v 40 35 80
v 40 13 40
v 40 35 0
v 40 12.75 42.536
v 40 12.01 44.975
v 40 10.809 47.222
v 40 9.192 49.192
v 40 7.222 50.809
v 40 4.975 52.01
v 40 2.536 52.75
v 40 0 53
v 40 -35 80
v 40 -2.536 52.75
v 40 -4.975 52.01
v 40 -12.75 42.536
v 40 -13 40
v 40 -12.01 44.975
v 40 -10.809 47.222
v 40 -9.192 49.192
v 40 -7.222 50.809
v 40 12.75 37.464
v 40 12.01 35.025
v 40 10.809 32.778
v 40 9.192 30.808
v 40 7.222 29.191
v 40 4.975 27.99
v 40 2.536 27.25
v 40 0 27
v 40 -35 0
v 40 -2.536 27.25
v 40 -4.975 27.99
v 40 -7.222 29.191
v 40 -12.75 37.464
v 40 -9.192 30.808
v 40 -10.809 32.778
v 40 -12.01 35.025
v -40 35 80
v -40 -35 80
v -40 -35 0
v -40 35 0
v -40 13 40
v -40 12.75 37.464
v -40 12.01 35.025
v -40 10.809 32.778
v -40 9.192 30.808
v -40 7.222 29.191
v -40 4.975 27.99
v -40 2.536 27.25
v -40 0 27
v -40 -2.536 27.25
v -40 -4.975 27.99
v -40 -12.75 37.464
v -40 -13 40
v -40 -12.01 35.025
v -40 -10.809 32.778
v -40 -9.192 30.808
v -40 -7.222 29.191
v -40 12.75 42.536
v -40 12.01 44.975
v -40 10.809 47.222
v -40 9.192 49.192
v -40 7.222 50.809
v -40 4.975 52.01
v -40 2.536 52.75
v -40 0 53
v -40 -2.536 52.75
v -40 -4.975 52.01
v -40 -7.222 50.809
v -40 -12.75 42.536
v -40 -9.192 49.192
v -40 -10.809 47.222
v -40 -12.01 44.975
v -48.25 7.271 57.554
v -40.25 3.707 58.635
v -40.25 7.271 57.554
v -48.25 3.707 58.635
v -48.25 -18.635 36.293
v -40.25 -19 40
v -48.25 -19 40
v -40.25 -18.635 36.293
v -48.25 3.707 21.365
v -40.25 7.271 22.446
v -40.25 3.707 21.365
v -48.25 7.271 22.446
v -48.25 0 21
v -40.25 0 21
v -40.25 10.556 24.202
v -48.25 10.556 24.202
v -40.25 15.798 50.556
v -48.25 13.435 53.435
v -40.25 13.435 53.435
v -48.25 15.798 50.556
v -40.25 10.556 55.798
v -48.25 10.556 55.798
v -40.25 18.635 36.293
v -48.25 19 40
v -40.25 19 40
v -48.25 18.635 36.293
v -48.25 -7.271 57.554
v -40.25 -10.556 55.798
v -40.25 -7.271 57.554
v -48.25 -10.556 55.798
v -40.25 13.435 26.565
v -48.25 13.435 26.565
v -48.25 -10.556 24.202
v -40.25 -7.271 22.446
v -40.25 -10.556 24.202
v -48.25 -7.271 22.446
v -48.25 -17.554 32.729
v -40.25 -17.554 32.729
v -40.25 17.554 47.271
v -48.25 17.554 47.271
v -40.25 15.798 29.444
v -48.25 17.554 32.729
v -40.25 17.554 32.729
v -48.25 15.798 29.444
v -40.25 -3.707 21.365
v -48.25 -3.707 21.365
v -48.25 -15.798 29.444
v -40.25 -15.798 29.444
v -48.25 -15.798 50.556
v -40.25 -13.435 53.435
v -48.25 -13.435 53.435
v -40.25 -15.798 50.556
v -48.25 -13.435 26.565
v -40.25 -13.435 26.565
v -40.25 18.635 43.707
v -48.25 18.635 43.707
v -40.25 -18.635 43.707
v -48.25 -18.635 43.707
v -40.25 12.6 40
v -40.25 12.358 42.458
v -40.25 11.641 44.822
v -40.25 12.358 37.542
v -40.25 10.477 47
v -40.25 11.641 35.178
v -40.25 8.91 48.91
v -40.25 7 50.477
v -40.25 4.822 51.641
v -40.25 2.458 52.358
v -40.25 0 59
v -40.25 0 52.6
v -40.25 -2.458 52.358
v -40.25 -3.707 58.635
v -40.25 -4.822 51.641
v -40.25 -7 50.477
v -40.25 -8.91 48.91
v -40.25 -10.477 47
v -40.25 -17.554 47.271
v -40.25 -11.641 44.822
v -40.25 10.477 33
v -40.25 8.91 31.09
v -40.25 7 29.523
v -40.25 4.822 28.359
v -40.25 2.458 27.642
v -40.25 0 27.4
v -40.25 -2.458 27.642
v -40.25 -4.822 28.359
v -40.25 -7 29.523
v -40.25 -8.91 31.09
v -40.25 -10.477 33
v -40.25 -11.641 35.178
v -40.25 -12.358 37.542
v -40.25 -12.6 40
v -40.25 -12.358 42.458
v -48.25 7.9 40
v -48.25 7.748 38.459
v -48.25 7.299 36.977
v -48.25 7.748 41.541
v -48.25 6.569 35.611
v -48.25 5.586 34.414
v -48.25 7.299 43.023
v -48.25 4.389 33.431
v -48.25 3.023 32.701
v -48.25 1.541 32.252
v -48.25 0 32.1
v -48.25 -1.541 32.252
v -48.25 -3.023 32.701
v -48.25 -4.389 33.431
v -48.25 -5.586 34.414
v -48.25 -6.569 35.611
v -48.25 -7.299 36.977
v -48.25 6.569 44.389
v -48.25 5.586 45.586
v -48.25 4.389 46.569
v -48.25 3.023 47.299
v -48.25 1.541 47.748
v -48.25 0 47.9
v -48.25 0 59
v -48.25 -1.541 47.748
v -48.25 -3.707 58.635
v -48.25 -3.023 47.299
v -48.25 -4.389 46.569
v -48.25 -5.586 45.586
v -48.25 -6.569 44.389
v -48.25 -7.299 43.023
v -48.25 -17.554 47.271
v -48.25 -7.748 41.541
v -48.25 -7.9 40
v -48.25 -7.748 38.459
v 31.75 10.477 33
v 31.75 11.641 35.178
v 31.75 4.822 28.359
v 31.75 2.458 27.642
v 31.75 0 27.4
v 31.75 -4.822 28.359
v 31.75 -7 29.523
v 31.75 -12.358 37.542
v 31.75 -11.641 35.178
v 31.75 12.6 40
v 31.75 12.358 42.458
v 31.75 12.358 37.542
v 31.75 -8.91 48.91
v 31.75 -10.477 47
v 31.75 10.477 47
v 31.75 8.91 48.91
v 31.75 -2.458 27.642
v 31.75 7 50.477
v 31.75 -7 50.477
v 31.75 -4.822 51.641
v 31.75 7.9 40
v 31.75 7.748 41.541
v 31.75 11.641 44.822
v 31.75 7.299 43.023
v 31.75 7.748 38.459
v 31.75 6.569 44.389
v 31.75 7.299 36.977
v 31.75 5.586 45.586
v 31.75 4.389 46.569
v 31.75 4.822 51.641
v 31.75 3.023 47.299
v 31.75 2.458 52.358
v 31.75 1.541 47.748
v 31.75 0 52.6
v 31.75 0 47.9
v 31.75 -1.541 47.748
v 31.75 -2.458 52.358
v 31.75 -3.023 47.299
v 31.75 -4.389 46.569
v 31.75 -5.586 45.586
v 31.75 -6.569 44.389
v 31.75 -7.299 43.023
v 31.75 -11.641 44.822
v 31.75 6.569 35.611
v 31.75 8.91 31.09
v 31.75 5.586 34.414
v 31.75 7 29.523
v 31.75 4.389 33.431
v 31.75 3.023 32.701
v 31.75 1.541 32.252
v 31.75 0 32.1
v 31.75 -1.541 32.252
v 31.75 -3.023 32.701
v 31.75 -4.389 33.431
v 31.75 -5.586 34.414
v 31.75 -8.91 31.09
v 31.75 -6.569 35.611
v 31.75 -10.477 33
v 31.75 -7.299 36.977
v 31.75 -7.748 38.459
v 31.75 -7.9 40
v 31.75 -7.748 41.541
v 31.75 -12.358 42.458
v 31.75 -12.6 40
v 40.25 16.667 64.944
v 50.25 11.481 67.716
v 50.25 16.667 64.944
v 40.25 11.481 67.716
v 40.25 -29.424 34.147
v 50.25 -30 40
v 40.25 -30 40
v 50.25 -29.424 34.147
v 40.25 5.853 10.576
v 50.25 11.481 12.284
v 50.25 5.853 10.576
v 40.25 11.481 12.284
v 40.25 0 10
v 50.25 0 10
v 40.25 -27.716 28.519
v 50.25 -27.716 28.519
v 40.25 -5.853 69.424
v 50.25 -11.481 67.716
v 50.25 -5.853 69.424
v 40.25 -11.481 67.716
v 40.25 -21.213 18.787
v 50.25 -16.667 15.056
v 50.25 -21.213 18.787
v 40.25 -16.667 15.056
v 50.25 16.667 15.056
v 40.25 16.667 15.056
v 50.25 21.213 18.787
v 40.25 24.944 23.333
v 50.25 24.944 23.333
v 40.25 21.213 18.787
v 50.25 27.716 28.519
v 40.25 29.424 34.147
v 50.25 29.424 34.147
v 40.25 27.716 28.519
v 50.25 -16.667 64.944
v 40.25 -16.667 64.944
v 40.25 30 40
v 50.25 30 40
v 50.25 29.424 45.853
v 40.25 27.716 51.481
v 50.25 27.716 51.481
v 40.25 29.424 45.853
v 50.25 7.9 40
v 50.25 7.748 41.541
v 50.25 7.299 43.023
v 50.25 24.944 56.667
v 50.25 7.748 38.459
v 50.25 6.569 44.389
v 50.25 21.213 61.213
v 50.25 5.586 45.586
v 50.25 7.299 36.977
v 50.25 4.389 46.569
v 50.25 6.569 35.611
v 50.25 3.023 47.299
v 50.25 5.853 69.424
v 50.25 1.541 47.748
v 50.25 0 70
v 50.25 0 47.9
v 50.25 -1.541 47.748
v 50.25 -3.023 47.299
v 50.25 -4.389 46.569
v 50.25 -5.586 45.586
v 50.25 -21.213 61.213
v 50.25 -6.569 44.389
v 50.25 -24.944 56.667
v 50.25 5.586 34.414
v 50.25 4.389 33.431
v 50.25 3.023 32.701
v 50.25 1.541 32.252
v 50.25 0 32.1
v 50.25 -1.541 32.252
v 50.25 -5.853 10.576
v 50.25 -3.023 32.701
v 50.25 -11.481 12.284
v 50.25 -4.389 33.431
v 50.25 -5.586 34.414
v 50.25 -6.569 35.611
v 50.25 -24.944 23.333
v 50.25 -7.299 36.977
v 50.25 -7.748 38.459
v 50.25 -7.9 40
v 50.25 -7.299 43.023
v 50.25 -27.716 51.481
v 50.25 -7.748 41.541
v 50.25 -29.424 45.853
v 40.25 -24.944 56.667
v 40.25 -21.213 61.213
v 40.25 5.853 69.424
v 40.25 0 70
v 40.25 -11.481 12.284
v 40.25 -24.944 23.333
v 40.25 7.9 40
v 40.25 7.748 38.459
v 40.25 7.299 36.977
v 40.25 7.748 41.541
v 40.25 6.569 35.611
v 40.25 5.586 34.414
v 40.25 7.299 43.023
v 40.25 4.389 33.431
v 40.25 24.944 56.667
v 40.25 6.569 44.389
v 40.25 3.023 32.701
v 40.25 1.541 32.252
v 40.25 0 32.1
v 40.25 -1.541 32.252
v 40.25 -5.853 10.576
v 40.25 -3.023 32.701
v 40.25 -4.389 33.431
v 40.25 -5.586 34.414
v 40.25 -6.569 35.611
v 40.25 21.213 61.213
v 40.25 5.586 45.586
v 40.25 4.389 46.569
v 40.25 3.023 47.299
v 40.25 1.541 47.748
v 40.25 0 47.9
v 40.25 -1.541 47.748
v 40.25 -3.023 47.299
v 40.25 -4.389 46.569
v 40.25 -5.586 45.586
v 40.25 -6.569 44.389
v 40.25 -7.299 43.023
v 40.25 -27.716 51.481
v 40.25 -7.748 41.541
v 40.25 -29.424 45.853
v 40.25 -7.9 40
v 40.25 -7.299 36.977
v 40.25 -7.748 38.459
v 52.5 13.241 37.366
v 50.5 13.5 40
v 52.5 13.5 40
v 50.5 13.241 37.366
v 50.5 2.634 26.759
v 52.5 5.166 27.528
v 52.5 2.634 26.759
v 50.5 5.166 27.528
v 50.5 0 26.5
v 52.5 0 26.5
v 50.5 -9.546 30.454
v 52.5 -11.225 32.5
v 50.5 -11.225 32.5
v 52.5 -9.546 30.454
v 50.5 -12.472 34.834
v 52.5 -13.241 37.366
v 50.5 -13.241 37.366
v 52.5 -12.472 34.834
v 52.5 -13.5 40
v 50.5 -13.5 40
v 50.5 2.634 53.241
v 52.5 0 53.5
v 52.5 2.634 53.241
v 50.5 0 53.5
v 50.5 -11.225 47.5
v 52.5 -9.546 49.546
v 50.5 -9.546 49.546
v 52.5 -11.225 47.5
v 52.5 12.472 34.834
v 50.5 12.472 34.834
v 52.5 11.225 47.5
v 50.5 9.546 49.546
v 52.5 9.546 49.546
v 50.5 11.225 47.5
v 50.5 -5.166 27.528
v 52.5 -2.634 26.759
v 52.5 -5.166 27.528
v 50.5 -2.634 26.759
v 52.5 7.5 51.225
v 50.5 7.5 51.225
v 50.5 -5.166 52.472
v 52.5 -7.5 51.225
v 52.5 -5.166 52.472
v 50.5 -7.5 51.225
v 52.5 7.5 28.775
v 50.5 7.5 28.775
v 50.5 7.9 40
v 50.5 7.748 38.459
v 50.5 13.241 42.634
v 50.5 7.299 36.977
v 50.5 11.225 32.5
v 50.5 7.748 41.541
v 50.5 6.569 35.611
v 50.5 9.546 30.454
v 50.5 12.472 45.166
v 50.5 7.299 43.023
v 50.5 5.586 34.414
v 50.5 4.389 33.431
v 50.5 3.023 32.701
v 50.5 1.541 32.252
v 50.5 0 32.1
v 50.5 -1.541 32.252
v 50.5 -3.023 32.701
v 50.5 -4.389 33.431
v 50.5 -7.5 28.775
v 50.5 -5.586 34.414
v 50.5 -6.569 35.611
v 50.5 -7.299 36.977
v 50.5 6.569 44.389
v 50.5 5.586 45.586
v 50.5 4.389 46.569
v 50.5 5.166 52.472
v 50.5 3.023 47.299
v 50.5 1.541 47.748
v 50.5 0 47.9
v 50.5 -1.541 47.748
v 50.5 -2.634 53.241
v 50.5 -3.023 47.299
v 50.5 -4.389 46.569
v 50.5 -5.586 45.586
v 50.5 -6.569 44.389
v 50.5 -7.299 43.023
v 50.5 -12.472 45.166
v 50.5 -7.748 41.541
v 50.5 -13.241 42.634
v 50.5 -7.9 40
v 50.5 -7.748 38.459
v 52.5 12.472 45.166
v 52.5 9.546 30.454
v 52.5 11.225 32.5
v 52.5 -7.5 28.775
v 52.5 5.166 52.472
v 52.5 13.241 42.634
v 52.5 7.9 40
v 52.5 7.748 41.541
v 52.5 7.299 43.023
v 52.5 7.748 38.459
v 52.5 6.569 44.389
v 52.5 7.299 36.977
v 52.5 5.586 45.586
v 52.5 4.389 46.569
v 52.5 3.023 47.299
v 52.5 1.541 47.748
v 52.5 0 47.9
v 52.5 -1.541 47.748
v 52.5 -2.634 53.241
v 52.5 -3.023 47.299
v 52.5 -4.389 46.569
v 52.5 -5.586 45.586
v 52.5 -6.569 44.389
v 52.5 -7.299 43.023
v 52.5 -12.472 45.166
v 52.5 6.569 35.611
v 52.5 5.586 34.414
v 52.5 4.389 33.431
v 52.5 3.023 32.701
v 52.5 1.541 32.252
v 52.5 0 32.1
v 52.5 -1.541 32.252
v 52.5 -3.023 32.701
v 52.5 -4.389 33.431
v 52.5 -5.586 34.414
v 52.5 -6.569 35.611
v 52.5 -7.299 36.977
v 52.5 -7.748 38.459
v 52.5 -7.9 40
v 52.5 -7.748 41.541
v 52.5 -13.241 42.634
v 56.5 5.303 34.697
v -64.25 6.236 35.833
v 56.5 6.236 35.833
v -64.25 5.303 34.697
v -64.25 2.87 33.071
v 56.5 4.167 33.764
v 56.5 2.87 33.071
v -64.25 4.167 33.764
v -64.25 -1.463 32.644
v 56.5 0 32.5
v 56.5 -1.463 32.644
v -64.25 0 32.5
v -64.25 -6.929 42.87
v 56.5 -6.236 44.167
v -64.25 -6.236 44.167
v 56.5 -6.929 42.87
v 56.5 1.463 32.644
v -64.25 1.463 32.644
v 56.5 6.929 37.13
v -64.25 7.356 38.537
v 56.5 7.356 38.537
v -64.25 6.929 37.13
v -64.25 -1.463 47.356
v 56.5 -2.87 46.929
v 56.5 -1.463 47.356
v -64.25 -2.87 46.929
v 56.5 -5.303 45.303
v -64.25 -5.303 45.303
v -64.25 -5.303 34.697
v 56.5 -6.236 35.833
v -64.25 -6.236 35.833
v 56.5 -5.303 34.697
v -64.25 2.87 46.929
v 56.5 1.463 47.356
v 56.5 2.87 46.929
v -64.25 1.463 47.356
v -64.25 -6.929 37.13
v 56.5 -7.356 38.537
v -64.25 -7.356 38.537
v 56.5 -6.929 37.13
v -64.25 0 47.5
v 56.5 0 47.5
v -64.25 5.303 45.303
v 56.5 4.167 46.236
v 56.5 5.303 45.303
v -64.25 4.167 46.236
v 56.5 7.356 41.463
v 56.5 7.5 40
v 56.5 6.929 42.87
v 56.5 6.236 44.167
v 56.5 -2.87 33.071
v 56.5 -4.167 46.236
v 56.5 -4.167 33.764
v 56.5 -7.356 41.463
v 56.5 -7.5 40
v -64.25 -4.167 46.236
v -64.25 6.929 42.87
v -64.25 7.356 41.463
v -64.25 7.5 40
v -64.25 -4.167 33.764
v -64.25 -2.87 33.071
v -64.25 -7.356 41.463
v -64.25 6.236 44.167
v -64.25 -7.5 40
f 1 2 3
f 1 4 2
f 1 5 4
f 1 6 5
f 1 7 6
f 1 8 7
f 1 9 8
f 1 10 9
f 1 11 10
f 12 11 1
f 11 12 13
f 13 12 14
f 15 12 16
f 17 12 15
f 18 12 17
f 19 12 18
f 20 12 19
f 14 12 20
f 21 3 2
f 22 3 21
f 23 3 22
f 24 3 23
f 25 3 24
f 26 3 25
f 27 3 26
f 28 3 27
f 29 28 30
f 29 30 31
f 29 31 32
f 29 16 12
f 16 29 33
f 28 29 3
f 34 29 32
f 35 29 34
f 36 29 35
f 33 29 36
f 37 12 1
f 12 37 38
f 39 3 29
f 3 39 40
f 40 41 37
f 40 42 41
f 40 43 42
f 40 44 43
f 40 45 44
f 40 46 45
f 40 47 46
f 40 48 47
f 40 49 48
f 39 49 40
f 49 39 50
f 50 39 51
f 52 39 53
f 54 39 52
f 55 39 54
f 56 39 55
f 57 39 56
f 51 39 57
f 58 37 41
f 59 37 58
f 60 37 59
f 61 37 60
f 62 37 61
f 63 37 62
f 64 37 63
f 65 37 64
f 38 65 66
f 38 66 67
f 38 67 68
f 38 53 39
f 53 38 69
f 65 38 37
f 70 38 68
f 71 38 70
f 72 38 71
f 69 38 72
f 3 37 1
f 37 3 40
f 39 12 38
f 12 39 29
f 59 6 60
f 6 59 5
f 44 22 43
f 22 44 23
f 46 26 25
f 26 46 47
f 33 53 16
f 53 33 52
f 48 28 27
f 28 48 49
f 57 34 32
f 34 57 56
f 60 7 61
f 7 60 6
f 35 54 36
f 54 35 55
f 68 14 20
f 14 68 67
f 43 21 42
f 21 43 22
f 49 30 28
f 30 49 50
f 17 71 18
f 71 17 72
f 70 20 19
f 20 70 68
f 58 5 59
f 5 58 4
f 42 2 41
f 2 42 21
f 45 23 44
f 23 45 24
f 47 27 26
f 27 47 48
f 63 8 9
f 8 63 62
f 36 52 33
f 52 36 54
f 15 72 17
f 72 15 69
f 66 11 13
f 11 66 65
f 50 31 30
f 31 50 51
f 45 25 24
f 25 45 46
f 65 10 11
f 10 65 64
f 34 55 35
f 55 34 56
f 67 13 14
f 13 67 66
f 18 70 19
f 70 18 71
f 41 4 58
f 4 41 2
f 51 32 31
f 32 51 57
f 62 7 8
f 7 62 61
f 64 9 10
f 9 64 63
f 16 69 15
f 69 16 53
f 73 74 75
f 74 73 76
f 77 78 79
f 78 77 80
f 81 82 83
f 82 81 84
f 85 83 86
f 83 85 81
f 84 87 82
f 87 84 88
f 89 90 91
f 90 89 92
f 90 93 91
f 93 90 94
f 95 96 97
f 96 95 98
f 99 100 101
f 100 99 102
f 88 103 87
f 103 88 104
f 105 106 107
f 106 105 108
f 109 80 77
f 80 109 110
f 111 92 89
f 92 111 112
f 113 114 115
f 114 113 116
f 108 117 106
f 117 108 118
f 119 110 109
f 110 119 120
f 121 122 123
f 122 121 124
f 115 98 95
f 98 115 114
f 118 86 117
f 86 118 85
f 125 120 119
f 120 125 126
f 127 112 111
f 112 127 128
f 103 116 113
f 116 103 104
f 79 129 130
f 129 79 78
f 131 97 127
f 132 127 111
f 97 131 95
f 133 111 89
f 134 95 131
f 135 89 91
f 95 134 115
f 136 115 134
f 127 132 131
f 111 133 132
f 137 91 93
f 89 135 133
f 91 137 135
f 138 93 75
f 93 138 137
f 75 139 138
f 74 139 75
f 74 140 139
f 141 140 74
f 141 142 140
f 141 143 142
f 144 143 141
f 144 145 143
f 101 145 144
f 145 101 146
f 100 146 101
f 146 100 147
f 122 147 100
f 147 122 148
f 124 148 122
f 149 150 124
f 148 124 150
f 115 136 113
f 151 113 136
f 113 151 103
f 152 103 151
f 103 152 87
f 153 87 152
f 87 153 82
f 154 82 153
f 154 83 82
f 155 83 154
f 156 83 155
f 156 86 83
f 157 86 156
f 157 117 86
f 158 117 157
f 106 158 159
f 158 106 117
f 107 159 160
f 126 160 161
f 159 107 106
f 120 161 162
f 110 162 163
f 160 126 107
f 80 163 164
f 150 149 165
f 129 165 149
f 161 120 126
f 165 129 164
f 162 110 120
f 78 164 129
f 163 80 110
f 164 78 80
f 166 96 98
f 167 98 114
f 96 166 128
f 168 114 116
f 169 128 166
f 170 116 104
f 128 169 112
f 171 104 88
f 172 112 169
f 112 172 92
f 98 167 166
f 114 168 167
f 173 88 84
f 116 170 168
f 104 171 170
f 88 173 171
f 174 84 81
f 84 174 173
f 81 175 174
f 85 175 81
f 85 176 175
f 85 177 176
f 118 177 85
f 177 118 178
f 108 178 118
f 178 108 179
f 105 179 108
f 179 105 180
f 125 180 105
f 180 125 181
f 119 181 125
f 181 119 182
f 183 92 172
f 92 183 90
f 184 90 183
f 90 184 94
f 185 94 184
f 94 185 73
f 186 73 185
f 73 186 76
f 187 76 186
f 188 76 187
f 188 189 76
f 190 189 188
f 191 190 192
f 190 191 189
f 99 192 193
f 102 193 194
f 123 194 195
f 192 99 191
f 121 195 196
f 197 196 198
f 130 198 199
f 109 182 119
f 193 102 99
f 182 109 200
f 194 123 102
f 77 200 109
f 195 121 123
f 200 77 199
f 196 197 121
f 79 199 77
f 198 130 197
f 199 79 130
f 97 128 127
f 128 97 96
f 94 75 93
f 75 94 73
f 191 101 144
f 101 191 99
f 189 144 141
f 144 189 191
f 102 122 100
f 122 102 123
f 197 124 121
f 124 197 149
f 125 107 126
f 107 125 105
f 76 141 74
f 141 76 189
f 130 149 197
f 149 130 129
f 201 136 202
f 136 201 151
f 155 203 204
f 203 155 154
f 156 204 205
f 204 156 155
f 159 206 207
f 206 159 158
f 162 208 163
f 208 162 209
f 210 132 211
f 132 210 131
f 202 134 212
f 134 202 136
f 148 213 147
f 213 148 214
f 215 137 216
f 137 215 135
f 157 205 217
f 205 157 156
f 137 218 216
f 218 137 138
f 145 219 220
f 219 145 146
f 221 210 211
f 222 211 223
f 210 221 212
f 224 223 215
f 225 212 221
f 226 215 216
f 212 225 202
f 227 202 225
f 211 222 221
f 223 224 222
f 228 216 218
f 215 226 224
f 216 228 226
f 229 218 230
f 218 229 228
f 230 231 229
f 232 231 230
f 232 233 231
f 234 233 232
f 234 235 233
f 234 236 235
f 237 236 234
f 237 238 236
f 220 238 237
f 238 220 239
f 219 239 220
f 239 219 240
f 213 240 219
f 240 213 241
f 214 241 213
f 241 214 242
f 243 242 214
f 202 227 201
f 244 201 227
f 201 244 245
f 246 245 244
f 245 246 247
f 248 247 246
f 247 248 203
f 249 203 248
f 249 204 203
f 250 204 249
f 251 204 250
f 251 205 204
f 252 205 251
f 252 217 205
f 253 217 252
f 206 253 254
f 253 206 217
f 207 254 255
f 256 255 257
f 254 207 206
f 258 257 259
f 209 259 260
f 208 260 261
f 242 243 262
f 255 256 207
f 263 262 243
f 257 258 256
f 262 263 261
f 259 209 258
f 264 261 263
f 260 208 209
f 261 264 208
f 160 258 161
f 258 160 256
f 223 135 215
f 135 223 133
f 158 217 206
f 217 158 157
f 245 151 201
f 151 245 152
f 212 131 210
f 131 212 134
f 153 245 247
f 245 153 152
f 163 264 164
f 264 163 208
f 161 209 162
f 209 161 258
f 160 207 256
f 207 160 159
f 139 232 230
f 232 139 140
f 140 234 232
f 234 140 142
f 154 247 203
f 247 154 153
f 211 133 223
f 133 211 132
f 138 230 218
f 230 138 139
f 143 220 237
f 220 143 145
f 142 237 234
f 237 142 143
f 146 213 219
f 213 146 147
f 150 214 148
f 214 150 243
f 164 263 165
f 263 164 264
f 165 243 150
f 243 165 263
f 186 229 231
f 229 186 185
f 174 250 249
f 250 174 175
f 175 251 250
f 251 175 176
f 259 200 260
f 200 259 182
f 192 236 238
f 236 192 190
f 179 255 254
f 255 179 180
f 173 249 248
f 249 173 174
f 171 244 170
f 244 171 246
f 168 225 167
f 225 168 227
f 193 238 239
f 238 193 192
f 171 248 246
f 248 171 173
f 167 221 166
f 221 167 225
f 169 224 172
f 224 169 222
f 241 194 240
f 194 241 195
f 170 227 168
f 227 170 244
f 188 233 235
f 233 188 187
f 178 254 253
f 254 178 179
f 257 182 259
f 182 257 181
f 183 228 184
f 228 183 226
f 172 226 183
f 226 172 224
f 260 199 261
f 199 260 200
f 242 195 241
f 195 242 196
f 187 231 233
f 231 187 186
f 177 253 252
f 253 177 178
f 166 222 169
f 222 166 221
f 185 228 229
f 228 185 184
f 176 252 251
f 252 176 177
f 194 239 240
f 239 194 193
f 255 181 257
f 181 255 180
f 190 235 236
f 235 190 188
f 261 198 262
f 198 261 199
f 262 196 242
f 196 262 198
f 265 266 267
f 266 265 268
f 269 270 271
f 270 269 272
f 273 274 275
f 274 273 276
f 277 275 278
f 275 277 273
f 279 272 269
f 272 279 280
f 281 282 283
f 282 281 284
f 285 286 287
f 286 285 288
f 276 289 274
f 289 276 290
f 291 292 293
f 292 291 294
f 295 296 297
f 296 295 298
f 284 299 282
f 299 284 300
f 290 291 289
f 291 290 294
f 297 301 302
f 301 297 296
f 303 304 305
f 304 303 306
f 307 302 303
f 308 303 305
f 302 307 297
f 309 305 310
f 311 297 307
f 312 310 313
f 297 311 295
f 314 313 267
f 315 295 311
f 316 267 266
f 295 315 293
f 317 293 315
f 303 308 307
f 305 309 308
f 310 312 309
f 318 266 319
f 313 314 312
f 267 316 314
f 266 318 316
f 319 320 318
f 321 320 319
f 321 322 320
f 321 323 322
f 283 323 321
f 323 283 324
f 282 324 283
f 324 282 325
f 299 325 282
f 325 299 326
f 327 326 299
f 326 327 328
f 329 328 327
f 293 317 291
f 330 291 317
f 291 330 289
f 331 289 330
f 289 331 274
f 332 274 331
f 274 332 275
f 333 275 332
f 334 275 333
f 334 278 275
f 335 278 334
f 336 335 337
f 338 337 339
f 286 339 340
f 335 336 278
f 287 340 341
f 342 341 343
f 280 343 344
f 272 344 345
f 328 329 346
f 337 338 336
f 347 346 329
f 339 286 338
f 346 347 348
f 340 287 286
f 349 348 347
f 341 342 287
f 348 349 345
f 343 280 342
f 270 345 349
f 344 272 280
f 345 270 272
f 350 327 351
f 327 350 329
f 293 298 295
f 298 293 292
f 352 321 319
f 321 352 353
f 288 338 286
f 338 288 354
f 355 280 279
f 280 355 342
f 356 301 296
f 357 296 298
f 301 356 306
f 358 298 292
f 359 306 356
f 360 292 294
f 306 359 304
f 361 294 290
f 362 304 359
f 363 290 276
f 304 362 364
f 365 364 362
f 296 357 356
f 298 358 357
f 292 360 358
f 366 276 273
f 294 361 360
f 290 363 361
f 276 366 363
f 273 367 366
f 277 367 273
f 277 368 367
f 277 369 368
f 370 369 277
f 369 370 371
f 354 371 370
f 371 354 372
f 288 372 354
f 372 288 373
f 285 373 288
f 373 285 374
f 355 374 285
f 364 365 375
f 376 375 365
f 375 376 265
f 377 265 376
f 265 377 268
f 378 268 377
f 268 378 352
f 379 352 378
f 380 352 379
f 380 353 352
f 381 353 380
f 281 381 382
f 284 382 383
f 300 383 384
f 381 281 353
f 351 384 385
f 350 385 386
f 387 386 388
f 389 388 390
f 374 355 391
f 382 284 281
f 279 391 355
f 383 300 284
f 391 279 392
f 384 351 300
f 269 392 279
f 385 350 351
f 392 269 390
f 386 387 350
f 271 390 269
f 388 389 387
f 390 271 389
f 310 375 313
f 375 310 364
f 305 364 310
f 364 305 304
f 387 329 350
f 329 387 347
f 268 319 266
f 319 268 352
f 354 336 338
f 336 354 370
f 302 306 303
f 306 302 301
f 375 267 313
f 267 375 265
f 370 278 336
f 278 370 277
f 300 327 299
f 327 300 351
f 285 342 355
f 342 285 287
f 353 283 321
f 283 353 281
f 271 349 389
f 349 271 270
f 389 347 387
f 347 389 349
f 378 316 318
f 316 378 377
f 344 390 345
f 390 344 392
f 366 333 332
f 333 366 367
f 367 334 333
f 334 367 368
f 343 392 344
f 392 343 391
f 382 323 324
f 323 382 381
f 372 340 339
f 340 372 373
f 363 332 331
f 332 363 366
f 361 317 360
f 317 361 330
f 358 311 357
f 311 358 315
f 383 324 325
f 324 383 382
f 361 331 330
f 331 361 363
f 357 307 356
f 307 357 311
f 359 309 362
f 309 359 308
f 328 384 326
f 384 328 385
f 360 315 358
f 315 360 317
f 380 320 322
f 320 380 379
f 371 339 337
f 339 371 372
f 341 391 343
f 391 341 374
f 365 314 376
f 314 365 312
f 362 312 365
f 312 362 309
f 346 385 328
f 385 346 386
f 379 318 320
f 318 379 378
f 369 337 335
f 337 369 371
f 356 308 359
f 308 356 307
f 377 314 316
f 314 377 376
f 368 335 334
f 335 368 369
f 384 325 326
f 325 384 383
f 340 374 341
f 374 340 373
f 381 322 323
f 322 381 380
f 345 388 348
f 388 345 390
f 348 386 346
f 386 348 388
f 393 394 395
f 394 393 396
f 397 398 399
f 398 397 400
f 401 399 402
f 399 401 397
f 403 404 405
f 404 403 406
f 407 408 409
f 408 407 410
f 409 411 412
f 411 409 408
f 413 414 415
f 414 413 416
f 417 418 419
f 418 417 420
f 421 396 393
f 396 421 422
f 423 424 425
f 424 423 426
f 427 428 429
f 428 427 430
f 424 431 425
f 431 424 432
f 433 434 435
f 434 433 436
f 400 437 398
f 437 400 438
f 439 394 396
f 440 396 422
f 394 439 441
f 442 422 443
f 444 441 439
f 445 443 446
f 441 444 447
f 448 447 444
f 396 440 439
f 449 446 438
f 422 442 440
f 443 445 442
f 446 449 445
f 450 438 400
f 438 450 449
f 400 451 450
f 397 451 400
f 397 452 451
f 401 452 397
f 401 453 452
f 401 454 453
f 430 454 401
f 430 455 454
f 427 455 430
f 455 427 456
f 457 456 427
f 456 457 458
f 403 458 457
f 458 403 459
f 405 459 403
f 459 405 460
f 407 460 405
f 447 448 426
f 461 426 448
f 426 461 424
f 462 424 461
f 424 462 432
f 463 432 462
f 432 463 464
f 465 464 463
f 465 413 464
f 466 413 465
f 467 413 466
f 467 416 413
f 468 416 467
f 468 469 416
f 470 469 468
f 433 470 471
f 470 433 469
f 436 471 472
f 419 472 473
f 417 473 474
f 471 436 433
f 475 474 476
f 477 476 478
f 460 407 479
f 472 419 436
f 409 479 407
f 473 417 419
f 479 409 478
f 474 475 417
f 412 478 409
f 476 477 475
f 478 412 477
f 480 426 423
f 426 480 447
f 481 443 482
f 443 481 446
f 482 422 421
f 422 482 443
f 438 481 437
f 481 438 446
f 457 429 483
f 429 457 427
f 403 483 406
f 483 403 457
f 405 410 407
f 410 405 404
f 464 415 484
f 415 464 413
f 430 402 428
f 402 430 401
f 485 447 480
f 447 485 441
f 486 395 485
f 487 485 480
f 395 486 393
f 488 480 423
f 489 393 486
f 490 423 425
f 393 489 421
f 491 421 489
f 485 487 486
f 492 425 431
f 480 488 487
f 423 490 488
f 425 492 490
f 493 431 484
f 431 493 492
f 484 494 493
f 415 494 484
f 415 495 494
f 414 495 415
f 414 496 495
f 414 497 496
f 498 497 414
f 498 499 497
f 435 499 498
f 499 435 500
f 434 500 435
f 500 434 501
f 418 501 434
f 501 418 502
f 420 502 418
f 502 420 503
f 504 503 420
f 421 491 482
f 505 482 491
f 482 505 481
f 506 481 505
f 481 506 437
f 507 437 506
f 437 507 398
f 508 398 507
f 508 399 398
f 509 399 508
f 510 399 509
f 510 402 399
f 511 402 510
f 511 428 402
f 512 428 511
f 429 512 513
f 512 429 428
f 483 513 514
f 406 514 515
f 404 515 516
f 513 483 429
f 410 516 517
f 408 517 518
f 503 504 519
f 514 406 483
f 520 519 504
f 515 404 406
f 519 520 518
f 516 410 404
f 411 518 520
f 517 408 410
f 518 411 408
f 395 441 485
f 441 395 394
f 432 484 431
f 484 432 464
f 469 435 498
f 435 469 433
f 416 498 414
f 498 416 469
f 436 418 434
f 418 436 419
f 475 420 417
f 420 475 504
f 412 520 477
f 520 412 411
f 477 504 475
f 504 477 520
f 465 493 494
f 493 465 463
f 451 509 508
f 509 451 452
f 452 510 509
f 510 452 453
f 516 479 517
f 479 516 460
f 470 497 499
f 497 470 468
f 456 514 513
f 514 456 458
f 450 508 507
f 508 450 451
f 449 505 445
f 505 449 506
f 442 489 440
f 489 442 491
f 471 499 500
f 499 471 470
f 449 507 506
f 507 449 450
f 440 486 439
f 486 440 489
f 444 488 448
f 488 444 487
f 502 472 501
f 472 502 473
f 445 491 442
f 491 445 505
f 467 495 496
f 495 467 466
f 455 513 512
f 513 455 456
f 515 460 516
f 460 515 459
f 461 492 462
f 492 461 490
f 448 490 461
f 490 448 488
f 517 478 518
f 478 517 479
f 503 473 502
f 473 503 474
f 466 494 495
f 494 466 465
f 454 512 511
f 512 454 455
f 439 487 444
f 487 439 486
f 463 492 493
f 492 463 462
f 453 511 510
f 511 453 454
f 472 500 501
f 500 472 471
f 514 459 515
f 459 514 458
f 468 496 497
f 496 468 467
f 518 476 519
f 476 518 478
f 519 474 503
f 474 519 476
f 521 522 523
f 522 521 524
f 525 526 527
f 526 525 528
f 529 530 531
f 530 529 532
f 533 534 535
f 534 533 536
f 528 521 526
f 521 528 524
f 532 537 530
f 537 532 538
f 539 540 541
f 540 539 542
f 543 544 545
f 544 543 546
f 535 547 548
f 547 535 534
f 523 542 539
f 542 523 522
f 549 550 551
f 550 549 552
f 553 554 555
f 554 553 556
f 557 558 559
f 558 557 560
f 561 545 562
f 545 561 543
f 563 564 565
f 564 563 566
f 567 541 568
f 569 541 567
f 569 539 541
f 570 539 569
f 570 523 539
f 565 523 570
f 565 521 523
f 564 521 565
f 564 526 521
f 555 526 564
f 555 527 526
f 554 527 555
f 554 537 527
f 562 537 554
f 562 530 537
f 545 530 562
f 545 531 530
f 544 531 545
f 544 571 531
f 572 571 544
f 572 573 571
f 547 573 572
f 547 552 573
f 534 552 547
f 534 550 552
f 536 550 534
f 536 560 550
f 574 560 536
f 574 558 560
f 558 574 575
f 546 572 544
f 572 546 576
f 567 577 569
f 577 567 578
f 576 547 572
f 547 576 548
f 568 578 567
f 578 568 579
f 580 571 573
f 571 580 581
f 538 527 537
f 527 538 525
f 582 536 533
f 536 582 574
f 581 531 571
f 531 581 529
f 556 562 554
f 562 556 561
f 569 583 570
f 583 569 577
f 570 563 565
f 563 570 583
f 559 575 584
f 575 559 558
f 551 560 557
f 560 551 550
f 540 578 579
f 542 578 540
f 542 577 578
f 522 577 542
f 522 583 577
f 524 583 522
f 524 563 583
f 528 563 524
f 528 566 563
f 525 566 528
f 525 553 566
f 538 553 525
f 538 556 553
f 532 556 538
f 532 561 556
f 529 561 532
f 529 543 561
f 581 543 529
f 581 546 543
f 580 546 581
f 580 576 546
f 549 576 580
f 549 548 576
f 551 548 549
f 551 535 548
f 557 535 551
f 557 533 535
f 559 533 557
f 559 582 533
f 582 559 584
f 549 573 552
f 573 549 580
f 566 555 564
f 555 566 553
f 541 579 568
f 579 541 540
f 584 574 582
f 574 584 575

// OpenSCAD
$fn = 32;

// ------------------------------------------------------------------------
// Bushed housing: 80 x 70 x 80 mm housing, bushing d25.2
// Every part is its own module, assembly() places them once.
// ------------------------------------------------------------------------

// --- part 1 ---
module housing() {
  difference() {
    translate([-40, -35, 0]) cube([80, 70, 80]);
    translate([0, 0, 40]) rotate([0, 90, 0]) cylinder(h = 82, d = 26, center = true);
  }
}

// --- part 2 ---
module bushing() {
  difference() {
    union() {
      cylinder(h = 8, d = 38);
      translate([0, 0, 8]) cylinder(h = 72, d = 25.2);
    }
    translate([0, 0, -1]) cylinder(h = 82, d = 15.8);
  }
}

// --- part 3 ---
module shaft() {
  translate([0, 0, -60.375]) cylinder(h = 120.75, d = 15);
}

// --- part 4 ---
module cover() {
  difference() {
    cylinder(h = 10, d = 60);
    translate([0, 0, -1]) cylinder(h = 12, d = 15.8);
  }
}

// --- part 5 ---
module washer() {
  difference() {
      translate([0, 0, 0]) cylinder(h = 2, d = 27);
      translate([0, 0, -1]) cylinder(h = 4, d = 15.8);
    }
}

// --- assembly ---
module assembly() {
  translate([0, 0, 0]) rotate([0, 0, 0]) housing();
  translate([-48.25, 0, 40]) rotate([0, 90, 0]) bushing();
  translate([-3.875, 0, 40]) rotate([0, 90, 0]) shaft();
  translate([40.25, 0, 40]) rotate([0, 90, 0]) cover();
  translate([50.5, 0, 40]) rotate([0, 90, 0]) washer();
}

assembly();
